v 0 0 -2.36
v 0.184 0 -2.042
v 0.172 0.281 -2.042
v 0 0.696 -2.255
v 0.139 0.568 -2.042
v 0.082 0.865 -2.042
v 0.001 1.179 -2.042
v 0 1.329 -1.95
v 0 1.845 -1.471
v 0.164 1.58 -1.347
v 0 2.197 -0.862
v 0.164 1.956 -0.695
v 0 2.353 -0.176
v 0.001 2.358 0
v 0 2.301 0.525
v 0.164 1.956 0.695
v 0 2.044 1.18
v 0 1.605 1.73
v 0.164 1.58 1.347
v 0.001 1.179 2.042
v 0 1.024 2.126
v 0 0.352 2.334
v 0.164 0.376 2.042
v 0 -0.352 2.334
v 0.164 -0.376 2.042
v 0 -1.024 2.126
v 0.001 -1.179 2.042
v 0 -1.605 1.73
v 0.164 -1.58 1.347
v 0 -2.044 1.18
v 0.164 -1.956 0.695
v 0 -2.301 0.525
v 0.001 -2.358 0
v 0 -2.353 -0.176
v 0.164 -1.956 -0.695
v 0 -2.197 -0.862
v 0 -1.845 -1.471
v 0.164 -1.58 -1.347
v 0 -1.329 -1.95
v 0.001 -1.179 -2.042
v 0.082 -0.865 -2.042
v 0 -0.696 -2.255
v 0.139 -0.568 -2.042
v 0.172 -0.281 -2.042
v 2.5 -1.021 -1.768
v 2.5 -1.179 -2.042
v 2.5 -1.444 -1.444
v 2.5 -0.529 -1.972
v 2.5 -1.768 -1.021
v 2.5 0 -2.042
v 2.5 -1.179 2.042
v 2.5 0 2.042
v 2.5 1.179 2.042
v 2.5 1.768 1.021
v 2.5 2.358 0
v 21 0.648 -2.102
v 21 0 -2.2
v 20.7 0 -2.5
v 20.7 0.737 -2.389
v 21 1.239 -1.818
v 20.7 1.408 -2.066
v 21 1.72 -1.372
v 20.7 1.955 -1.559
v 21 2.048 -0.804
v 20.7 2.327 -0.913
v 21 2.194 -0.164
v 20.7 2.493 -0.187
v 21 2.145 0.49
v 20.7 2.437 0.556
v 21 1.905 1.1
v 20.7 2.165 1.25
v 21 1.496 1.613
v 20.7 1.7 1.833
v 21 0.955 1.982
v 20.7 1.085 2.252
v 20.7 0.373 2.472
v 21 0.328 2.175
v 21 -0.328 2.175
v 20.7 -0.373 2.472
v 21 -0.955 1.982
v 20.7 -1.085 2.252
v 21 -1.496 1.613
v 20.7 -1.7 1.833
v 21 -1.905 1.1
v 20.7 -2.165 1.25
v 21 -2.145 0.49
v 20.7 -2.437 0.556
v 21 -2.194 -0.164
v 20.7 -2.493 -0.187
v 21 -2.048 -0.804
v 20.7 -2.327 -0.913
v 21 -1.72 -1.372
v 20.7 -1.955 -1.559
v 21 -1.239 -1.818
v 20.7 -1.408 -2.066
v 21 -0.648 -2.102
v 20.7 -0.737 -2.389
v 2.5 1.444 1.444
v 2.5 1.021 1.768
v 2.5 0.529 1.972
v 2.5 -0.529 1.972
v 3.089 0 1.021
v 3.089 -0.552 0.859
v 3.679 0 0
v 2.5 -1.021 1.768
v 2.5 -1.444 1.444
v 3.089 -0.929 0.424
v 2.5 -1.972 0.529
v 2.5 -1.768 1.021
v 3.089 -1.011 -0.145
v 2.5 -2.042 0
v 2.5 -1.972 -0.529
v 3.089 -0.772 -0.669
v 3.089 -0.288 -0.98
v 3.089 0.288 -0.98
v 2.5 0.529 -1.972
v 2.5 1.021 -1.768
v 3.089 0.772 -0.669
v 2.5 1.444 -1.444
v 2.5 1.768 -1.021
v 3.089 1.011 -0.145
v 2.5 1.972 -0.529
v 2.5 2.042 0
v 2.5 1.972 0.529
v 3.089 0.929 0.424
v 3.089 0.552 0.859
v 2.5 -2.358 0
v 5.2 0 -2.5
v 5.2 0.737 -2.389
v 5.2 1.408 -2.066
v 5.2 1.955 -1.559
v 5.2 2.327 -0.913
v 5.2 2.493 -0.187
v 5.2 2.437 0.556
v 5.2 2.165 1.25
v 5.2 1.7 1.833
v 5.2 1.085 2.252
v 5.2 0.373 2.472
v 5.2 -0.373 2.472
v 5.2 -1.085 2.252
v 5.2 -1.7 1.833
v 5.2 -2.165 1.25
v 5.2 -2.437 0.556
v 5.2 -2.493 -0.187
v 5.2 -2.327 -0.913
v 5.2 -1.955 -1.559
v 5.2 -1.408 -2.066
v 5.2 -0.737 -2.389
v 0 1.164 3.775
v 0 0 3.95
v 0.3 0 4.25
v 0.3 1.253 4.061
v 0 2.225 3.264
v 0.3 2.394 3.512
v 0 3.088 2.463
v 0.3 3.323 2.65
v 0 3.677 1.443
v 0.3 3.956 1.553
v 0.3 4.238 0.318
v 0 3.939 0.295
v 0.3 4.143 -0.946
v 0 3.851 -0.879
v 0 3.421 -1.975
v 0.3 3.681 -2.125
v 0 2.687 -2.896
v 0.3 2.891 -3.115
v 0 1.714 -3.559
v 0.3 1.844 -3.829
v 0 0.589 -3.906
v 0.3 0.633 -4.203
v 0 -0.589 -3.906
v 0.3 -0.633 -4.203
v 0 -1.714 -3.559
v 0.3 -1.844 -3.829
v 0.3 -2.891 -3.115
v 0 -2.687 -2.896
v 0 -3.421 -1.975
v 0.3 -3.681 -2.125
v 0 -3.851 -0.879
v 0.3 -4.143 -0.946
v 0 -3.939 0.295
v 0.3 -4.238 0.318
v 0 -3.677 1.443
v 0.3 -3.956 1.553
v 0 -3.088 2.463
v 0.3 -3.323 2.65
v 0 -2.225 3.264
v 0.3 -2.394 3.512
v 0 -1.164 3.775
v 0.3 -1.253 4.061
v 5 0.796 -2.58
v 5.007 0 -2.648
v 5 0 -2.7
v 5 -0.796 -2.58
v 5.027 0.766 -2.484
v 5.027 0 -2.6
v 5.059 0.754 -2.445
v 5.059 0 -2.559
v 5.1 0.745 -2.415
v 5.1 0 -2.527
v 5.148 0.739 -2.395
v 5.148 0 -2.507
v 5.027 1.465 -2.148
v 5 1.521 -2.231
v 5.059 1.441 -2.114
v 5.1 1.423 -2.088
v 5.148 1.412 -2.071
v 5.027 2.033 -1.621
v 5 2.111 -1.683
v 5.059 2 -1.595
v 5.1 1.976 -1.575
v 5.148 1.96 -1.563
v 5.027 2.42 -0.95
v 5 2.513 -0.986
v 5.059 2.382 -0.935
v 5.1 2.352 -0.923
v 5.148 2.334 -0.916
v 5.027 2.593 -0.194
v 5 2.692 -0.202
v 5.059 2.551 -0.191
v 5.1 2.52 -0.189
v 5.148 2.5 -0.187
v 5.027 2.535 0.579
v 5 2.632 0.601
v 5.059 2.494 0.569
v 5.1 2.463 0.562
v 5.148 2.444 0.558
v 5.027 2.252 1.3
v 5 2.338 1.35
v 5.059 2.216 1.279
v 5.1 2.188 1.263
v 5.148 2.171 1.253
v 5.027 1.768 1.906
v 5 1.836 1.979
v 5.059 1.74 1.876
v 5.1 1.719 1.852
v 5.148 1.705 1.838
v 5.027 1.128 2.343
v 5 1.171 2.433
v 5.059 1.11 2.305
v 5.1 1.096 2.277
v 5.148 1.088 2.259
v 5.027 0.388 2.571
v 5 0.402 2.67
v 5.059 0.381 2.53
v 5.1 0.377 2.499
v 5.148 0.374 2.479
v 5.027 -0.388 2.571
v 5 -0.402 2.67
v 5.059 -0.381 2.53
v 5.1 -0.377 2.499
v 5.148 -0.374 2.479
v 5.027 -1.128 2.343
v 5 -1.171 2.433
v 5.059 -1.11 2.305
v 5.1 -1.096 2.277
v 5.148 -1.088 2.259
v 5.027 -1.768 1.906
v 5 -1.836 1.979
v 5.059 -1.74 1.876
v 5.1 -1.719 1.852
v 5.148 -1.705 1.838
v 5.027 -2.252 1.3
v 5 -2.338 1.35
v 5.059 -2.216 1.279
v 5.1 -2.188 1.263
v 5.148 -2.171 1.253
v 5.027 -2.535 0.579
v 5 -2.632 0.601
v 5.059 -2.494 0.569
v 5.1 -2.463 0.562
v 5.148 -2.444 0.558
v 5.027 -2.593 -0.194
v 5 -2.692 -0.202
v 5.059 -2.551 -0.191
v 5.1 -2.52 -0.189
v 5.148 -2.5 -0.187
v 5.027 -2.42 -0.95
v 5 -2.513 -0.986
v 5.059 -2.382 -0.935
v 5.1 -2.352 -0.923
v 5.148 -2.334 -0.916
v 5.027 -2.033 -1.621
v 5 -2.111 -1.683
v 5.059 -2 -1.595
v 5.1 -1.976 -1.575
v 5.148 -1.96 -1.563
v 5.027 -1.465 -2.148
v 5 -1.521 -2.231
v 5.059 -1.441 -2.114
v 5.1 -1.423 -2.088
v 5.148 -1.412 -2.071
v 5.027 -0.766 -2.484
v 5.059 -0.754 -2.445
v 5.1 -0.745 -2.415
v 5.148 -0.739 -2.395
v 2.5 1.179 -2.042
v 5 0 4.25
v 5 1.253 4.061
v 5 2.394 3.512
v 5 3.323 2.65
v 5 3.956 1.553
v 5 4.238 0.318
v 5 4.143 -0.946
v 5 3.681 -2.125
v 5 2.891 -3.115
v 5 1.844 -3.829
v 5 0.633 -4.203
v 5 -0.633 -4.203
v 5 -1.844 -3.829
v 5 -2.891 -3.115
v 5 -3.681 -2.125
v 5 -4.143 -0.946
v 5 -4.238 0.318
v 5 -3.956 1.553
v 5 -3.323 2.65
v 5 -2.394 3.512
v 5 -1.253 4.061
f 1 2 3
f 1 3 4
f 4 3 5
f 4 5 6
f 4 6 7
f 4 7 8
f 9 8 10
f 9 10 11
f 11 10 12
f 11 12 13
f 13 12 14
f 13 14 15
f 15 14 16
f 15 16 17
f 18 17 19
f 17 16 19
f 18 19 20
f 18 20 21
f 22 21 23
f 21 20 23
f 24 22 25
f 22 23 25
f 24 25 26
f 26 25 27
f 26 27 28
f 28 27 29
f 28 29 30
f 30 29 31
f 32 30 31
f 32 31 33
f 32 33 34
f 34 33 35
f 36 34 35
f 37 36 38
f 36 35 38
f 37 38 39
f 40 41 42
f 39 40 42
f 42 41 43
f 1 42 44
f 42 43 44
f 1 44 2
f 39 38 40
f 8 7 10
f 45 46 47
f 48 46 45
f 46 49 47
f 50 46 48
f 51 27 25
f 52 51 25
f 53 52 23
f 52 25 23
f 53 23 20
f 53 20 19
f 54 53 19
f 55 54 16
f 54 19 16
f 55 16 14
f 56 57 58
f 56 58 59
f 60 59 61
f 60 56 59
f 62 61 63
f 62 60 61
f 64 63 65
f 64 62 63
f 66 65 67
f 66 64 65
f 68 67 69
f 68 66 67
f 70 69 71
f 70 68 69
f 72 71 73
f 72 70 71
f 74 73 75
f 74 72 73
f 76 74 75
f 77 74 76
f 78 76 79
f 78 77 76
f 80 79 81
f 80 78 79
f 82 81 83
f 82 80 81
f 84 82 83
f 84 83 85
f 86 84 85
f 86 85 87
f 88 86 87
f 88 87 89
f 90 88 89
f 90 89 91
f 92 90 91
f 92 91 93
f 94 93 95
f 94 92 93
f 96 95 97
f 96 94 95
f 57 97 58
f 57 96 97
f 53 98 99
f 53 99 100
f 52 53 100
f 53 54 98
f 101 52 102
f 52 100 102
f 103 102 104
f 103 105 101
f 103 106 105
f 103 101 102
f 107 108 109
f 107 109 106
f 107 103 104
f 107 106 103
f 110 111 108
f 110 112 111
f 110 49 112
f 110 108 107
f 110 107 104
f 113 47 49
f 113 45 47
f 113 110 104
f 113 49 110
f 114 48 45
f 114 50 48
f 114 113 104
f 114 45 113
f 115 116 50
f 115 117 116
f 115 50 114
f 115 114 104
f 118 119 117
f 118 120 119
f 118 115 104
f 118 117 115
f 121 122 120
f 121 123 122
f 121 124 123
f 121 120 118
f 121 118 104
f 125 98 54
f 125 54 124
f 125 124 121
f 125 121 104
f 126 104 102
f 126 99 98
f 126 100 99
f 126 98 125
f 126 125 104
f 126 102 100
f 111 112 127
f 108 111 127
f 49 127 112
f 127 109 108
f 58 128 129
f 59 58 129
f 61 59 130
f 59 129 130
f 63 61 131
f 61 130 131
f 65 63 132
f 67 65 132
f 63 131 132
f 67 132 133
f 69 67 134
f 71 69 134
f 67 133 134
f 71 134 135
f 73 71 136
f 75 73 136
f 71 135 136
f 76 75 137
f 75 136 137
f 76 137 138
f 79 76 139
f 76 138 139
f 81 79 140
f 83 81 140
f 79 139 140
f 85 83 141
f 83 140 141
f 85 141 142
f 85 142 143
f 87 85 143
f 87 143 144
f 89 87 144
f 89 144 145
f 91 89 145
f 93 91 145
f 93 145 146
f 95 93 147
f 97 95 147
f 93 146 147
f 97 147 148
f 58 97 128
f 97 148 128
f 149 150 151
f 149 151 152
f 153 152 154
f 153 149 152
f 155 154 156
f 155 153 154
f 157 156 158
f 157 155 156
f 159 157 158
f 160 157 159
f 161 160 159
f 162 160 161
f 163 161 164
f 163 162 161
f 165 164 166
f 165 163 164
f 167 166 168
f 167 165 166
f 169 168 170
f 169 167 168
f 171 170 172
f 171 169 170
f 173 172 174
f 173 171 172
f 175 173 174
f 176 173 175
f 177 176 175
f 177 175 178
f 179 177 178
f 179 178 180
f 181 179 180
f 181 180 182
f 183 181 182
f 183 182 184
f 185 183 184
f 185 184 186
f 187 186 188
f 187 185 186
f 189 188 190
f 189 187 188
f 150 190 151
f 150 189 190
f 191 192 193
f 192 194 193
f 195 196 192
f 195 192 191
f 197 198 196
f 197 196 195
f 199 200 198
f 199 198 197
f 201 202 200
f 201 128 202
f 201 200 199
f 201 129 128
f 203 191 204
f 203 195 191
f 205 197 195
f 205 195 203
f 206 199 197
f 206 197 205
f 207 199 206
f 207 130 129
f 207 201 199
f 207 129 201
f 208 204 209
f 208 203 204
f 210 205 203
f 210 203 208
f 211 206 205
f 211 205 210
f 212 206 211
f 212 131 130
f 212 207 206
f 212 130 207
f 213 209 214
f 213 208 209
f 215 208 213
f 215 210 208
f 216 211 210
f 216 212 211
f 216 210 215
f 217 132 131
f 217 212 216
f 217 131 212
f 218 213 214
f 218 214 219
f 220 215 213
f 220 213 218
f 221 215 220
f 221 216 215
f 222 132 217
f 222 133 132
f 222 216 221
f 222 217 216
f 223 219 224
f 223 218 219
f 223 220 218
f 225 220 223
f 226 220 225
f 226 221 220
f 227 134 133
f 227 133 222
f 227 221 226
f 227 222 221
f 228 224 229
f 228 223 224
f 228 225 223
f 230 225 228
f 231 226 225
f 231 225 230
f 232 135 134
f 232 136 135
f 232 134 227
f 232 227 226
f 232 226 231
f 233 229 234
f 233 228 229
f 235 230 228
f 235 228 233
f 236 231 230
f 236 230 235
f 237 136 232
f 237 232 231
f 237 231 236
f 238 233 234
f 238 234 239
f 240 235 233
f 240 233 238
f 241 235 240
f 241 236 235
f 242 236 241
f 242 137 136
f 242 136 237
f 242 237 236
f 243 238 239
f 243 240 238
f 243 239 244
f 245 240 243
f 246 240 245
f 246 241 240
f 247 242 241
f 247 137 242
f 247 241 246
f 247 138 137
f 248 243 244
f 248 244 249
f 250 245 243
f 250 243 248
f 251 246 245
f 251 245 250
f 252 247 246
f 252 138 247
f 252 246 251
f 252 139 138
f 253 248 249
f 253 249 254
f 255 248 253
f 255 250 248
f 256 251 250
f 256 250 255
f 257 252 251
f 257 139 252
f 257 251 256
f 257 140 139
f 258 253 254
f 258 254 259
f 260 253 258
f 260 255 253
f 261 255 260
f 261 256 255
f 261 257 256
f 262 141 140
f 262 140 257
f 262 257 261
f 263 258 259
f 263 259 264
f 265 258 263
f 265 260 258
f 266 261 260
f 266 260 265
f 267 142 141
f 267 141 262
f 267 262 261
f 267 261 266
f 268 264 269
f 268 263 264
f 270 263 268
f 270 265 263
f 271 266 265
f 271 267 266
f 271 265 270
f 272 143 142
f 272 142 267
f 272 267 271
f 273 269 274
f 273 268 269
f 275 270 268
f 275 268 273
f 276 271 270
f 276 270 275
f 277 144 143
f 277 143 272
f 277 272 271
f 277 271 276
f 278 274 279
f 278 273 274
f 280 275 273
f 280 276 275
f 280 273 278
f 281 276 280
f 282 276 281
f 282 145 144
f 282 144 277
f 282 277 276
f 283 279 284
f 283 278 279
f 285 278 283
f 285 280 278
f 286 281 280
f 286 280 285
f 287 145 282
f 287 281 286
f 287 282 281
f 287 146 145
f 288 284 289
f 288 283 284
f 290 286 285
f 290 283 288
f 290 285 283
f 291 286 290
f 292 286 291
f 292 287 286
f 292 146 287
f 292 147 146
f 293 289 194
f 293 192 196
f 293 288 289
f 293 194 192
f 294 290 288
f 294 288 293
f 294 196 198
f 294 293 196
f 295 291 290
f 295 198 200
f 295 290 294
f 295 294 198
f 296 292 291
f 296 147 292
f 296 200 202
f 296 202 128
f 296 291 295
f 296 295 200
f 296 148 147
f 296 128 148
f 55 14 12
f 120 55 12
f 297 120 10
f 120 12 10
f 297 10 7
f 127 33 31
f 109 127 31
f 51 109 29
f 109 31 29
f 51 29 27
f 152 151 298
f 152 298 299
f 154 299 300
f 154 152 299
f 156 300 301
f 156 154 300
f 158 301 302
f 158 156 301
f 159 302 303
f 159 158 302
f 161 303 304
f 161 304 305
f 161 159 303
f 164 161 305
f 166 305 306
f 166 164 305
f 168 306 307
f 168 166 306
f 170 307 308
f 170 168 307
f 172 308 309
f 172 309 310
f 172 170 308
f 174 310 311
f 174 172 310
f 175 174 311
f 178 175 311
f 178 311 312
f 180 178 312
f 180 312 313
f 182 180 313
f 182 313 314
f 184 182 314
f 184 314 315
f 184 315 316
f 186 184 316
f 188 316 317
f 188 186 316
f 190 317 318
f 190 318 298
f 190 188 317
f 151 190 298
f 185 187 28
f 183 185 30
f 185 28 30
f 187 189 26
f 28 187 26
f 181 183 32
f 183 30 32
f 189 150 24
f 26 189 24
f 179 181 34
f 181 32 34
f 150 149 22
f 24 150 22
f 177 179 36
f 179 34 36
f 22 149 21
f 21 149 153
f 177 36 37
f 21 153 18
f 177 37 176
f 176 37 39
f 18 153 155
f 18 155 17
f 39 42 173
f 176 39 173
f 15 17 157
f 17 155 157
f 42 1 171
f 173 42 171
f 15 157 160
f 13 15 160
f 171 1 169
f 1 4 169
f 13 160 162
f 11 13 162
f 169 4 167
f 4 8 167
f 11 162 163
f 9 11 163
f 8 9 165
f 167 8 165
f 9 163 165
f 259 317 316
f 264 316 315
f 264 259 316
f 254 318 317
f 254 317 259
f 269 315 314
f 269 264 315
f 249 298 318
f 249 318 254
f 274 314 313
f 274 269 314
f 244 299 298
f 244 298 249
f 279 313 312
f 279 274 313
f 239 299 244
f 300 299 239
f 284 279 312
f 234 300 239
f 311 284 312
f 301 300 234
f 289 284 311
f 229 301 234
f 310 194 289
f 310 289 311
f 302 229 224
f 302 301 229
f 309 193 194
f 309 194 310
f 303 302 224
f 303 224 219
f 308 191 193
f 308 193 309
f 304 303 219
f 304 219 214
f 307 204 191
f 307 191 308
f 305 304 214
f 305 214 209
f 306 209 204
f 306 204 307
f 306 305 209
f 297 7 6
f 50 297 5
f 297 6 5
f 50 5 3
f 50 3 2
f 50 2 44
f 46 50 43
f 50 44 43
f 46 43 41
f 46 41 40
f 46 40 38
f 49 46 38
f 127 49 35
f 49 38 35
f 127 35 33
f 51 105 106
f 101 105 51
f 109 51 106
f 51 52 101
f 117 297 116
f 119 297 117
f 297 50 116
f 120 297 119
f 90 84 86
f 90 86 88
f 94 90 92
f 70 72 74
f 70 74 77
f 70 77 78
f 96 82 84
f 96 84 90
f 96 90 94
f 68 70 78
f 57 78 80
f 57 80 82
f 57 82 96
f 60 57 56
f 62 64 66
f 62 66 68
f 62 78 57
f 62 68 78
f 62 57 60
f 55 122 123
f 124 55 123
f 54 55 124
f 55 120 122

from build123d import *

# Parameters (mm, degrees)
ESBO_O1_W                = 5
ESBO_O1_H                = 4.25
ESBO_O2_R                = 2.5
RESSALTO_EXTRUS_O1_DEPTH = 16
CORTE_EXTRUS_O1_DEPTH    = 2.5
CHANFRO1_SIZE            = 0.3
FILETE1_R                = 0.2


with BuildPart() as part:
    # Esboço1 → Revolução1 (revolve)
    with BuildSketch(Plane(origin=(0, 0, 0), x_dir=(-1, 0, 0), z_dir=(0, 0, -1)), mode=Mode.PRIVATE) as revolu_o1_sk:
        with Locations((-2.5, 2.125)):
            Rectangle(ESBO_O1_W, ESBO_O1_H)
    revolve(revolu_o1_sk.sketch.rotate(Axis((5, 0, 0), (-1, 0, 0)), 270), axis=Axis((5, 0, 0), (-1, 0, 0)))

    # Esboço2 → Ressalto-extrusão1 (add)
    with BuildSketch(Plane(origin=(5, 0, 0), x_dir=(0, 0, -1), z_dir=(1, 0, 0))):
        Circle(ESBO_O2_R)
    extrude(amount=RESSALTO_EXTRUS_O1_DEPTH)

    # Esboço3 → Corte-extrusão1 (cut)
    with BuildSketch(Plane.ZY):
        Polygon((0, -2.357898499), (2.042, -1.17894925), (2.042, 1.17894925), (0, 2.357898499), (-2.042, 1.17894925), (-2.042, -1.17894925), align=None)
    extrude(amount=-CORTE_EXTRUS_O1_DEPTH, mode=Mode.SUBTRACT)

    # Esboço4 → Corte-Revolução1 (revolve, cut)
    with BuildSketch(Plane.XY, mode=Mode.PRIVATE) as corte_revolu_o1_sk:
        Polygon((2.5, 2.042), (2.5, 0), (3.67894925, 0), align=None)
    revolve(corte_revolu_o1_sk.sketch.rotate(Axis((2.5, 0, 0), (1, 0, 0)), 90), axis=Axis((2.5, 0, 0), (1, 0, 0)), mode=Mode.SUBTRACT)

    # Chanfro1
    chanfro1_edges = [part.edges().sort_by_distance(p)[0] for p in [
        (21, 0, 2.5),
        (0, 0, -4.25),
    ]]
    chamfer(chanfro1_edges, length=CHANFRO1_SIZE)

    # Filete1
    filete1_edges = [part.edges().sort_by_distance(p)[0] for p in [
        (5, 0, 2.5),
    ]]
    fillet(filete1_edges, radius=FILETE1_R)

    # Sketch1 → Cut-Revolve1 (revolve, cut)
    with BuildSketch(Plane(origin=(0, 0, 0), x_dir=(1, 0, 0), z_dir=(0, 1, 0))):
        Polygon((0, 2.36), (1.362546635, 0), (0, 0), align=None)
    revolve(axis=Axis((1.362546635, 0, 0), (1, 0, 0)), mode=Mode.SUBTRACT)


solid = part.part
